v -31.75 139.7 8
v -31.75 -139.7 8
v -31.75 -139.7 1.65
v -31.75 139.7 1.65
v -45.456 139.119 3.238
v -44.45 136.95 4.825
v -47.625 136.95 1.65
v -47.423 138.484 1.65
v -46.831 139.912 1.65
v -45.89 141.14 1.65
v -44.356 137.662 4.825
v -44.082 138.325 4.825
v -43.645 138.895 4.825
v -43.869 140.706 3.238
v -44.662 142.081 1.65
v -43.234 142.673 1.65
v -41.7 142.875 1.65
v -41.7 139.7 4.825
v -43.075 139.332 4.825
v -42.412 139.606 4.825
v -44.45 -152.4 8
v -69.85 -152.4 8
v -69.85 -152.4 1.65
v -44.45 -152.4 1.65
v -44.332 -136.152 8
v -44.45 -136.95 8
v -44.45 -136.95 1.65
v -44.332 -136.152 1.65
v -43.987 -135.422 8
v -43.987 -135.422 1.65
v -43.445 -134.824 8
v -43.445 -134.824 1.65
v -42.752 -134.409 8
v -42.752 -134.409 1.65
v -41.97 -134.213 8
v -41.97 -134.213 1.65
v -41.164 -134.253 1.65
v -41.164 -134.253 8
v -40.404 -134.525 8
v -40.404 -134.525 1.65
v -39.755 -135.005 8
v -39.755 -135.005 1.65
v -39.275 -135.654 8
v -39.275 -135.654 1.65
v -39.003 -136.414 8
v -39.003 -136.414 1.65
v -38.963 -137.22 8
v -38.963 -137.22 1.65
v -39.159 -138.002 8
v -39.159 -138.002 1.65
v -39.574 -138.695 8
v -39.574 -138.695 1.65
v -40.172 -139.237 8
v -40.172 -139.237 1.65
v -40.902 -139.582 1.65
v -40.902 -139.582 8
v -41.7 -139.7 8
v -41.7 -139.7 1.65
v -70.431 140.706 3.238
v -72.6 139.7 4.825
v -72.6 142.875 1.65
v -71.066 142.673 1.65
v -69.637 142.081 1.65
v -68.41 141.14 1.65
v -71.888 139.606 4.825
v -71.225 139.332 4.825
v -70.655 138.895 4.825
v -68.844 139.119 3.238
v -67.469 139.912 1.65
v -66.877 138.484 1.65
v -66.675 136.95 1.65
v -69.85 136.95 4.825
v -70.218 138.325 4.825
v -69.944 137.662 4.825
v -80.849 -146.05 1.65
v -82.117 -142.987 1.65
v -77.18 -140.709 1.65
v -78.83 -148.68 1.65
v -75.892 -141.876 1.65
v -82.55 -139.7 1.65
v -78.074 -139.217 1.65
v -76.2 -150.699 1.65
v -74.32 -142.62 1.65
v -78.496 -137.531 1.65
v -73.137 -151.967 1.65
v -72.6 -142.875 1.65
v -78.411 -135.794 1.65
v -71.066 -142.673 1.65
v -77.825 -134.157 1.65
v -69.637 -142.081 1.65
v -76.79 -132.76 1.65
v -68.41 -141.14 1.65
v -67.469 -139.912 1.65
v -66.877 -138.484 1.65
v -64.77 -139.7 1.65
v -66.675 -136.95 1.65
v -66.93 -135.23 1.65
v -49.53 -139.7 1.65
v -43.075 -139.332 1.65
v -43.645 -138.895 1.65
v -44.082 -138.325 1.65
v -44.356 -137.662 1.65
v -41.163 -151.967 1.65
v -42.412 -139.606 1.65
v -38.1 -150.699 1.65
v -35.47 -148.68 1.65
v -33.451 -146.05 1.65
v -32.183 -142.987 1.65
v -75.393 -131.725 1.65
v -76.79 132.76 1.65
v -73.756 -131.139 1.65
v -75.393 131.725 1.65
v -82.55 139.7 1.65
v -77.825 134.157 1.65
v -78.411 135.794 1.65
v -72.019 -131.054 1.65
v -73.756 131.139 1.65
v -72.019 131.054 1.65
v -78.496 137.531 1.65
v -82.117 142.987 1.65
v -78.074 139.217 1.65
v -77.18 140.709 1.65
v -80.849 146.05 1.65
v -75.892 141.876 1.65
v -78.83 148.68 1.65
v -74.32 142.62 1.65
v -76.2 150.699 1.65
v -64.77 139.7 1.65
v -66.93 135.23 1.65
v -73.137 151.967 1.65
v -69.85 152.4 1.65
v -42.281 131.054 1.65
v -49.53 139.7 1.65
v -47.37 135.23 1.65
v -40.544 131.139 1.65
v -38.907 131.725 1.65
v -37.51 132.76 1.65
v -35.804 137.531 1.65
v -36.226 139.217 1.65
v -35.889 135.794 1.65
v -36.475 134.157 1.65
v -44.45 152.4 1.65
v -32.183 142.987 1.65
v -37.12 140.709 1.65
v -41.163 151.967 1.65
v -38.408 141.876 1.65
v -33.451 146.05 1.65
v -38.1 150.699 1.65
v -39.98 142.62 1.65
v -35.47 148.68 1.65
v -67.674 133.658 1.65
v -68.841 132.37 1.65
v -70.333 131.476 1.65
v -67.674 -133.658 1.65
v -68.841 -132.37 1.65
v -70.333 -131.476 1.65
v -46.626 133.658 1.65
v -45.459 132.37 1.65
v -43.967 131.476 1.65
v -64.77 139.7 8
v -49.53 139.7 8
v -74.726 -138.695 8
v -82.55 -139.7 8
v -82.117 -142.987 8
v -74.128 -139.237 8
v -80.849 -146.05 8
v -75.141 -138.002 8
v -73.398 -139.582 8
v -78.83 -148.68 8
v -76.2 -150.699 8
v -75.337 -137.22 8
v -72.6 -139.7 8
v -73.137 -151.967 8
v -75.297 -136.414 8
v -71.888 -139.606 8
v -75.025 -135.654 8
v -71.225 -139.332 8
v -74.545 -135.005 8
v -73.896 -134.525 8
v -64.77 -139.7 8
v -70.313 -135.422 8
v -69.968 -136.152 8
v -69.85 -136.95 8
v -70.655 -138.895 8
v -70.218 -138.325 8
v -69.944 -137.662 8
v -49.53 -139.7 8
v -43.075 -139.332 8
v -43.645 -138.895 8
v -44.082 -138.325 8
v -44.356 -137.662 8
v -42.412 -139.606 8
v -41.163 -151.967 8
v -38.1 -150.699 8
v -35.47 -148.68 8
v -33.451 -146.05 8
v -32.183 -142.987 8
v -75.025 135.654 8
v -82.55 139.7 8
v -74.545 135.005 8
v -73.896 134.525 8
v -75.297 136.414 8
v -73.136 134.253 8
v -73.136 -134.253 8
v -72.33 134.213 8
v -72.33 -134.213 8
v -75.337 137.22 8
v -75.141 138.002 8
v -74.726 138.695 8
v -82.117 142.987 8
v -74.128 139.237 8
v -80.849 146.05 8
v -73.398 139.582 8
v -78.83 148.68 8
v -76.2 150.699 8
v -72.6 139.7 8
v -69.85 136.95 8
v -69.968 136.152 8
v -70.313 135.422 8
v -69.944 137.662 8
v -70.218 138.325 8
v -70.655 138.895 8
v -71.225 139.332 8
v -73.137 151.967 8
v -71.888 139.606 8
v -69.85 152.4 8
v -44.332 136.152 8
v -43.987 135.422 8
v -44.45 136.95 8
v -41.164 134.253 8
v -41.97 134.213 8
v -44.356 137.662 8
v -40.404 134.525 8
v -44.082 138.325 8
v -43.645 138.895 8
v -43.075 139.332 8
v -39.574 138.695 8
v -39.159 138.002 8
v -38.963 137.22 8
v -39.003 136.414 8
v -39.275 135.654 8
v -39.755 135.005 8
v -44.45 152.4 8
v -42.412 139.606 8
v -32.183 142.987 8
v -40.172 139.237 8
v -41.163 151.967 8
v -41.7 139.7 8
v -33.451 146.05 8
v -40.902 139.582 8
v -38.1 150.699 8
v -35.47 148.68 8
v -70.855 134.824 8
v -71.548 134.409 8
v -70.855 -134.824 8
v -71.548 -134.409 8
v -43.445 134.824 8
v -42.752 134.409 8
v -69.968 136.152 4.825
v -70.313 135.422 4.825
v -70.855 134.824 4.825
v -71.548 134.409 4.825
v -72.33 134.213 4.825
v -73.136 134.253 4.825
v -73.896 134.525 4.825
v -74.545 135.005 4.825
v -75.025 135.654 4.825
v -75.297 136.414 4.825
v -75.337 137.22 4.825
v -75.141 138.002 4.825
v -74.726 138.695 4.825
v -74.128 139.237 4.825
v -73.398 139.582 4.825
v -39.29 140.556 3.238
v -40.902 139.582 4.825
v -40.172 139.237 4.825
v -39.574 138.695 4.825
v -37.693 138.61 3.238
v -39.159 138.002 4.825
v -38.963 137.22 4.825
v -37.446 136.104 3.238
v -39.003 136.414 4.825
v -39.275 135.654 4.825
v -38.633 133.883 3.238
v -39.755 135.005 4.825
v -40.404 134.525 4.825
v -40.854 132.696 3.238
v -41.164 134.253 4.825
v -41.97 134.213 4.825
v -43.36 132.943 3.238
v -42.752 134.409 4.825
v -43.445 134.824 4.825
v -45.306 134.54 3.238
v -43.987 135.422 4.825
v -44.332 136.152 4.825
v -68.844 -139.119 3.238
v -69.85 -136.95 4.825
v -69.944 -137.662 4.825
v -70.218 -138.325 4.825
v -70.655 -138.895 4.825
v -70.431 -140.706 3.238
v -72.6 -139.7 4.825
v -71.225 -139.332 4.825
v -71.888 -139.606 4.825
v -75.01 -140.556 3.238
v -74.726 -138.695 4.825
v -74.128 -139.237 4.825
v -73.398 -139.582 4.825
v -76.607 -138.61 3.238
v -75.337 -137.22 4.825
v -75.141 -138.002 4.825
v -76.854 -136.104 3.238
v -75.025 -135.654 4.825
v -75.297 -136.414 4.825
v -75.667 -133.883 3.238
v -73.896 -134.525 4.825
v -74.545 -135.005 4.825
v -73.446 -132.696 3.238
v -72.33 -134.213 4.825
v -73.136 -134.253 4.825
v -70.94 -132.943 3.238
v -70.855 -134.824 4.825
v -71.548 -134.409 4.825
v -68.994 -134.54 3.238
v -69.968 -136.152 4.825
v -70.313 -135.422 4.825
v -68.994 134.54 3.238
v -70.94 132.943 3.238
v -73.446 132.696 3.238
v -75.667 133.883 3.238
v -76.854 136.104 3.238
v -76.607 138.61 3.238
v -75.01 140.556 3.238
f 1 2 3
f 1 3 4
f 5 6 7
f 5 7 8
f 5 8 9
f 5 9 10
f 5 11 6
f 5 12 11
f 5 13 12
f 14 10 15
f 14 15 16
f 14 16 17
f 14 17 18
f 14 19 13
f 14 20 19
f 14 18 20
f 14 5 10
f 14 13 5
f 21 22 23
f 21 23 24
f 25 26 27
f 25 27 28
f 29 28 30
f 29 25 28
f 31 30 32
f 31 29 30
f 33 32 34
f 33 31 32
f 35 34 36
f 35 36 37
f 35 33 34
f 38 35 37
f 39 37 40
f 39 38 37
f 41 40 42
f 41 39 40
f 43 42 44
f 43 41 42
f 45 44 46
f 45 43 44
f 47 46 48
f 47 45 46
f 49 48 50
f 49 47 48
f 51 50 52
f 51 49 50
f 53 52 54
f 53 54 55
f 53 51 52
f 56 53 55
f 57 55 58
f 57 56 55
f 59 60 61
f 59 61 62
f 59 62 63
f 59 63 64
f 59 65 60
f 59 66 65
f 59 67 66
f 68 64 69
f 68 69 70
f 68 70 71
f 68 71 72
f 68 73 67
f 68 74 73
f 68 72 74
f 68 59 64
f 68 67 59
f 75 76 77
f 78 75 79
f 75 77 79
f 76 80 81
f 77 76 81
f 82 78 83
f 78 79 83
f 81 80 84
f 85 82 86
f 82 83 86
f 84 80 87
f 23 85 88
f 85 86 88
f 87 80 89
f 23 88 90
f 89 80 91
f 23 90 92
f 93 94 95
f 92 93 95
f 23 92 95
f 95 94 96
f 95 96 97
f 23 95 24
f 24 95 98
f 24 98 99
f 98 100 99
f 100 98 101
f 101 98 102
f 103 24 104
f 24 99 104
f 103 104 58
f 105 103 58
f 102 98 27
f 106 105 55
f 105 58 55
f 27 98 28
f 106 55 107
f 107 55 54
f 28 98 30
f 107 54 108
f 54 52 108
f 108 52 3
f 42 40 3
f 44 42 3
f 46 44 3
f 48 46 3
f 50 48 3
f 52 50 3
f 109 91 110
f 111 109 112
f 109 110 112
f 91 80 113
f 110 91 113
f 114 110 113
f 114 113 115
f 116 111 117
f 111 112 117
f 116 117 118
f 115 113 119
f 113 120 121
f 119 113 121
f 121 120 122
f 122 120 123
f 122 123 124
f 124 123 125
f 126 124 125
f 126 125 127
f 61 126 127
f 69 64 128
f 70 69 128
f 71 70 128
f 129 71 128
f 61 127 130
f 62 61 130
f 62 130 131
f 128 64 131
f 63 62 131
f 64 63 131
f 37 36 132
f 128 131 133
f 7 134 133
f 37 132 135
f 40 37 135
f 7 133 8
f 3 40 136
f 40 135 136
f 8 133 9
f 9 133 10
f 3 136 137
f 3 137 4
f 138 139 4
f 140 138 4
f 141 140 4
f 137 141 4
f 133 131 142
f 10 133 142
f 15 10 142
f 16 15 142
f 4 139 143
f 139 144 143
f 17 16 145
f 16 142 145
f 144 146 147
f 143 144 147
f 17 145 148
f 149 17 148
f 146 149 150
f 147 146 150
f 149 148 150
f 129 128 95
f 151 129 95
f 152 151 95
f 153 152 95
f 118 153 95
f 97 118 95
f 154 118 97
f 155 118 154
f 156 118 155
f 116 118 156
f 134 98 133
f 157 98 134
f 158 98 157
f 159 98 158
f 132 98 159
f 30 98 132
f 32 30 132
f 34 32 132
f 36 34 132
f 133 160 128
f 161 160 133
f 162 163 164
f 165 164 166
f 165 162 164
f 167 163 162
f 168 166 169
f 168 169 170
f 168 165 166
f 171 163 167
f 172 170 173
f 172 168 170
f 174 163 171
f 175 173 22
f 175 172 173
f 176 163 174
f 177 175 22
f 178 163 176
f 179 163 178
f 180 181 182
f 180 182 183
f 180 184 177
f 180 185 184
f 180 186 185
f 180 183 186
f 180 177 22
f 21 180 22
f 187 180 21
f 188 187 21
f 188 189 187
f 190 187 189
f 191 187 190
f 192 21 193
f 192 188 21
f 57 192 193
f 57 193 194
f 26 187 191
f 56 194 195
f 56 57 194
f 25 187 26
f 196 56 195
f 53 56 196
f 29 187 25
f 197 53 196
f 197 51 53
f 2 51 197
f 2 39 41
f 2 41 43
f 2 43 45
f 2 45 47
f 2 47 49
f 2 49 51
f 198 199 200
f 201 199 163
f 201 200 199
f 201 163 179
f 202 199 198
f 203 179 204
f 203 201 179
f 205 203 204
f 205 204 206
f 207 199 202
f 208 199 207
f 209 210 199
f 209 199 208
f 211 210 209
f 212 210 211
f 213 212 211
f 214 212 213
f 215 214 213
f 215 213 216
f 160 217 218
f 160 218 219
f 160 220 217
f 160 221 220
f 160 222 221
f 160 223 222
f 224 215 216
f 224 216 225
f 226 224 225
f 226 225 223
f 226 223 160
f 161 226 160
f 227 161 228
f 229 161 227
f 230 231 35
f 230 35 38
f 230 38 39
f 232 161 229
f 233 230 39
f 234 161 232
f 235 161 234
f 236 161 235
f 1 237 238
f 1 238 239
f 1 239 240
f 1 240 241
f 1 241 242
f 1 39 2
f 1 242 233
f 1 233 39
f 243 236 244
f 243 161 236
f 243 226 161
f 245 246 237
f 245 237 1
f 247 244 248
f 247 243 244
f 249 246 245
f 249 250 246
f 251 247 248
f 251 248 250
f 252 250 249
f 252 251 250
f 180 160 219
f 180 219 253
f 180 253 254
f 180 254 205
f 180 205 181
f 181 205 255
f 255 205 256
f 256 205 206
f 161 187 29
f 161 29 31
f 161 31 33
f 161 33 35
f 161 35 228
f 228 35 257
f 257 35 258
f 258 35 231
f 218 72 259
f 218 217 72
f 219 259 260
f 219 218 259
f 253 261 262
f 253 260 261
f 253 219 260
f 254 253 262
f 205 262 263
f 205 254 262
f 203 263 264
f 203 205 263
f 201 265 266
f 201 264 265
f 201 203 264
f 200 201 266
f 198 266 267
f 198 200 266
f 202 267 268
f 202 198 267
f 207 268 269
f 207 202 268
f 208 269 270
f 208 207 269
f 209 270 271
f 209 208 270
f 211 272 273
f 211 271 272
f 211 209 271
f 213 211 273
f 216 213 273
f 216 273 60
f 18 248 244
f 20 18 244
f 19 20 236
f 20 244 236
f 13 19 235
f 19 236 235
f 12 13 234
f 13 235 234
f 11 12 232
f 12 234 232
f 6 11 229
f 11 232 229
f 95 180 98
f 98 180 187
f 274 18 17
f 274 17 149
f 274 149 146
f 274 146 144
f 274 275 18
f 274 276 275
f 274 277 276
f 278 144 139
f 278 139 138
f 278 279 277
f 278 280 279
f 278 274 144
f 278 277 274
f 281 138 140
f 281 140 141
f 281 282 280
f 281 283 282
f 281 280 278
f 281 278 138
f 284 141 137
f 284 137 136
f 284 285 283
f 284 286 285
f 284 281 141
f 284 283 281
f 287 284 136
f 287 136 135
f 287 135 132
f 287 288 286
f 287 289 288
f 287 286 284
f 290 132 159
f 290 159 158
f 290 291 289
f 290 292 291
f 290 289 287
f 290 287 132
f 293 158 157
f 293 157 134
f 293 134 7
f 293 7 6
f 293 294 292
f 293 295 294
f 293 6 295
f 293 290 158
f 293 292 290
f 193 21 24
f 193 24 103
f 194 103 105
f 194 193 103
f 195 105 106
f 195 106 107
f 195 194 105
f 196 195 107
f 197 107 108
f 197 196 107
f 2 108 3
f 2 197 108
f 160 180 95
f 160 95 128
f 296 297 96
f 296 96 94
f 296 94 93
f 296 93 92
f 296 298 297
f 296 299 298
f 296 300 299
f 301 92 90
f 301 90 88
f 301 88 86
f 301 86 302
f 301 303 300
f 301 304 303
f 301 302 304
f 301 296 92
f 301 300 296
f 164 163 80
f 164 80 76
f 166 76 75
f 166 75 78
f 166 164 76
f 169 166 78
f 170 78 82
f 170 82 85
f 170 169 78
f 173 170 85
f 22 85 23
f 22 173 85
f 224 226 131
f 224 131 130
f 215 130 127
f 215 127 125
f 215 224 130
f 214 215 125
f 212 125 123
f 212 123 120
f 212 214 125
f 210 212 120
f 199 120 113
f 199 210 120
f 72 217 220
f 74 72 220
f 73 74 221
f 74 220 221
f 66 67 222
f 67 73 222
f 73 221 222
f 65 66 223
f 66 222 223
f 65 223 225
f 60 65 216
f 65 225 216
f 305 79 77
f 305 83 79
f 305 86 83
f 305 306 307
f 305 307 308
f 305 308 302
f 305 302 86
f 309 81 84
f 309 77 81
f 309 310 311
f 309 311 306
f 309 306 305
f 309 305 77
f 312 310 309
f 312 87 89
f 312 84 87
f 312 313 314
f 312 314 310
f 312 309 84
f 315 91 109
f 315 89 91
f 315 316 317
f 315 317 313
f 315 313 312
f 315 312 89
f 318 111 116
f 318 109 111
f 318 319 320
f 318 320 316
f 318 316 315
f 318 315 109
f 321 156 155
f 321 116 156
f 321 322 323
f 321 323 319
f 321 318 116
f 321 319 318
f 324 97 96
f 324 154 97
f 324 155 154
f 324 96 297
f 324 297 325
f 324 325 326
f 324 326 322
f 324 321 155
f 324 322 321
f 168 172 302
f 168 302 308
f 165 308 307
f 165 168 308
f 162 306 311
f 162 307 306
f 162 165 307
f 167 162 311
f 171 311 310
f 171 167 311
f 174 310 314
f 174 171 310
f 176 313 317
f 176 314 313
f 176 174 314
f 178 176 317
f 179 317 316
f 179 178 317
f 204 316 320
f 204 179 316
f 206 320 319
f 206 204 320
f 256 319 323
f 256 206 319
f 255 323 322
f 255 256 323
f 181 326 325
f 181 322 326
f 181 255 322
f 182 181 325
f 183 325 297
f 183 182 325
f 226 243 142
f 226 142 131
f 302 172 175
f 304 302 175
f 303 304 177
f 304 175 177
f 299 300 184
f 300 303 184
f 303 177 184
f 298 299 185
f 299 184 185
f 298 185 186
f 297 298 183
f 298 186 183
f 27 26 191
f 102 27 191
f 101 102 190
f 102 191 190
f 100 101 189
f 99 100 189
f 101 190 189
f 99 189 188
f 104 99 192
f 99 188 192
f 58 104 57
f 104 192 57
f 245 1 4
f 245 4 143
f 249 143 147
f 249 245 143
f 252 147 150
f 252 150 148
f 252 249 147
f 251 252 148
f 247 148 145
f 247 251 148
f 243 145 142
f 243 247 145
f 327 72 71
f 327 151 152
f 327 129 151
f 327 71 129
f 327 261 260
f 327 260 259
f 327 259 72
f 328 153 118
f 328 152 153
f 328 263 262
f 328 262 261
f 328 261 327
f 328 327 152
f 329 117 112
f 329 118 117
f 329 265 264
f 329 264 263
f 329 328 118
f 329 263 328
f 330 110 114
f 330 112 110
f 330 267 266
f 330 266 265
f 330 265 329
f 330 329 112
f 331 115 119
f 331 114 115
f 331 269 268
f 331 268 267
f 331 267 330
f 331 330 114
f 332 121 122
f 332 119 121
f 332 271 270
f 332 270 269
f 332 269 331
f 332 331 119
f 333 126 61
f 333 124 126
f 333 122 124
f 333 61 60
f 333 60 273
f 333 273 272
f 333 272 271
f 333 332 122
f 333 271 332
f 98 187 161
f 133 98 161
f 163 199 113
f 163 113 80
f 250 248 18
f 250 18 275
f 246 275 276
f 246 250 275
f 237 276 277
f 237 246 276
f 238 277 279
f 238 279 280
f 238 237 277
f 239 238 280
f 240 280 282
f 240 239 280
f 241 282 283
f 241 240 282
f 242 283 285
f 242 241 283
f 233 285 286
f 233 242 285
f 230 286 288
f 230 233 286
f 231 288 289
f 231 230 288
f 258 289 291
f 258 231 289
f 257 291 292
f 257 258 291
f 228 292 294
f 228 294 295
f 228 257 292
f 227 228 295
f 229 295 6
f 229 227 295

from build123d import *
from build123d.topology import SkipClean

# Parameters (mm, degrees)
SKETCH1_W           = 15.24
SKETCH1_H           = 279.4
BOSS_EXTRUDE3_DEPTH = 6.35
SKETCH2_R           = 2.75
CUT_EXTRUDE1_DEPTH  = 174.437553604
CHAMFER1_SIZE       = 3.175


with BuildPart() as part:
    # Sketch1 → Boss-Extrude3 (new body)
    with BuildSketch(Plane.XY.offset(8)):
        with BuildLine():
            Line((-69.85, -152.4), (-44.45, -152.4))
            ThreePointArc((-44.45, -152.4), (-35.469743879, -148.680256121), (-31.75, -139.7))
            Line((-31.75, -139.7), (-31.75, 139.7))
            ThreePointArc((-31.75, 139.7), (-35.469743879, 148.680256121), (-44.45, 152.4))
            Line((-44.45, 152.4), (-69.85, 152.4))
            ThreePointArc((-69.85, 152.4), (-78.830256121, 148.680256121), (-82.55, 139.7))
            Line((-82.55, 139.7), (-82.55, -139.7))
            ThreePointArc((-82.55, -139.7), (-78.830256121, -148.680256121), (-69.85, -152.4))
        make_face()
        with Locations((-57.15, 0)):
            Rectangle(SKETCH1_W, SKETCH1_H, mode=Mode.SUBTRACT)
        with BuildLine():
            ThreePointArc((-44.45, -136.95), (-39.755456352, -135.005456352), (-41.7, -139.7))
            ThreePointArc((-41.7, -139.7), (-42.505456352, -137.755456352), (-44.45, -136.95))
        make_face(mode=Mode.SUBTRACT)
        with BuildLine():
            ThreePointArc((-72.6, -139.7), (-74.544543648, -135.005456352), (-69.85, -136.95))
            ThreePointArc((-69.85, -136.95), (-71.794543648, -137.755456352), (-72.6, -139.7))
        make_face(mode=Mode.SUBTRACT)
        with BuildLine():
            ThreePointArc((-41.7, 139.7), (-39.755456352, 135.005456352), (-44.45, 136.95))
            ThreePointArc((-44.45, 136.95), (-42.505456352, 137.755456352), (-41.7, 139.7))
        make_face(mode=Mode.SUBTRACT)
        with BuildLine():
            ThreePointArc((-69.85, 136.95), (-74.544543648, 135.005456352), (-72.6, 139.7))
            ThreePointArc((-72.6, 139.7), (-71.794543648, 137.755456352), (-69.85, 136.95))
        make_face(mode=Mode.SUBTRACT)
    extrude(amount=-BOSS_EXTRUDE3_DEPTH)

    # Sketch2 → Cut-Extrude1 (cut, through all)
    with SkipClean():  # the faces are left unmerged after this step: merging them gives an invalid solid
        with BuildSketch(Plane.XY.offset(8)):
            with Locations(Location((-41.7, 136.95, 0), (0, 0, 180))):
                Circle(SKETCH2_R)
            with Locations(Location((-72.6, 136.95, 0), (0, 0, 180))):
                Circle(SKETCH2_R)
            with Locations(Location((-41.7, -136.95, 0), (0, 0, 180))):
                Circle(SKETCH2_R)
            with Locations(Location((-72.6, -136.95, 0), (0, 0, 180))):
                Circle(SKETCH2_R)
        extrude(amount=-CUT_EXTRUDE1_DEPTH, mode=Mode.SUBTRACT)

    # Chamfer1
    chamfer1_edges = [part.edges().sort_by_distance(p)[0] for p in [
        (-39.755456352, 135.005456352, 1.65),
        (-72.6, 134.2, 1.65),
        (-72.6, -134.2, 1.65),
    ]]
    chamfer(chamfer1_edges, length=CHAMFER1_SIZE)


solid = part.part
